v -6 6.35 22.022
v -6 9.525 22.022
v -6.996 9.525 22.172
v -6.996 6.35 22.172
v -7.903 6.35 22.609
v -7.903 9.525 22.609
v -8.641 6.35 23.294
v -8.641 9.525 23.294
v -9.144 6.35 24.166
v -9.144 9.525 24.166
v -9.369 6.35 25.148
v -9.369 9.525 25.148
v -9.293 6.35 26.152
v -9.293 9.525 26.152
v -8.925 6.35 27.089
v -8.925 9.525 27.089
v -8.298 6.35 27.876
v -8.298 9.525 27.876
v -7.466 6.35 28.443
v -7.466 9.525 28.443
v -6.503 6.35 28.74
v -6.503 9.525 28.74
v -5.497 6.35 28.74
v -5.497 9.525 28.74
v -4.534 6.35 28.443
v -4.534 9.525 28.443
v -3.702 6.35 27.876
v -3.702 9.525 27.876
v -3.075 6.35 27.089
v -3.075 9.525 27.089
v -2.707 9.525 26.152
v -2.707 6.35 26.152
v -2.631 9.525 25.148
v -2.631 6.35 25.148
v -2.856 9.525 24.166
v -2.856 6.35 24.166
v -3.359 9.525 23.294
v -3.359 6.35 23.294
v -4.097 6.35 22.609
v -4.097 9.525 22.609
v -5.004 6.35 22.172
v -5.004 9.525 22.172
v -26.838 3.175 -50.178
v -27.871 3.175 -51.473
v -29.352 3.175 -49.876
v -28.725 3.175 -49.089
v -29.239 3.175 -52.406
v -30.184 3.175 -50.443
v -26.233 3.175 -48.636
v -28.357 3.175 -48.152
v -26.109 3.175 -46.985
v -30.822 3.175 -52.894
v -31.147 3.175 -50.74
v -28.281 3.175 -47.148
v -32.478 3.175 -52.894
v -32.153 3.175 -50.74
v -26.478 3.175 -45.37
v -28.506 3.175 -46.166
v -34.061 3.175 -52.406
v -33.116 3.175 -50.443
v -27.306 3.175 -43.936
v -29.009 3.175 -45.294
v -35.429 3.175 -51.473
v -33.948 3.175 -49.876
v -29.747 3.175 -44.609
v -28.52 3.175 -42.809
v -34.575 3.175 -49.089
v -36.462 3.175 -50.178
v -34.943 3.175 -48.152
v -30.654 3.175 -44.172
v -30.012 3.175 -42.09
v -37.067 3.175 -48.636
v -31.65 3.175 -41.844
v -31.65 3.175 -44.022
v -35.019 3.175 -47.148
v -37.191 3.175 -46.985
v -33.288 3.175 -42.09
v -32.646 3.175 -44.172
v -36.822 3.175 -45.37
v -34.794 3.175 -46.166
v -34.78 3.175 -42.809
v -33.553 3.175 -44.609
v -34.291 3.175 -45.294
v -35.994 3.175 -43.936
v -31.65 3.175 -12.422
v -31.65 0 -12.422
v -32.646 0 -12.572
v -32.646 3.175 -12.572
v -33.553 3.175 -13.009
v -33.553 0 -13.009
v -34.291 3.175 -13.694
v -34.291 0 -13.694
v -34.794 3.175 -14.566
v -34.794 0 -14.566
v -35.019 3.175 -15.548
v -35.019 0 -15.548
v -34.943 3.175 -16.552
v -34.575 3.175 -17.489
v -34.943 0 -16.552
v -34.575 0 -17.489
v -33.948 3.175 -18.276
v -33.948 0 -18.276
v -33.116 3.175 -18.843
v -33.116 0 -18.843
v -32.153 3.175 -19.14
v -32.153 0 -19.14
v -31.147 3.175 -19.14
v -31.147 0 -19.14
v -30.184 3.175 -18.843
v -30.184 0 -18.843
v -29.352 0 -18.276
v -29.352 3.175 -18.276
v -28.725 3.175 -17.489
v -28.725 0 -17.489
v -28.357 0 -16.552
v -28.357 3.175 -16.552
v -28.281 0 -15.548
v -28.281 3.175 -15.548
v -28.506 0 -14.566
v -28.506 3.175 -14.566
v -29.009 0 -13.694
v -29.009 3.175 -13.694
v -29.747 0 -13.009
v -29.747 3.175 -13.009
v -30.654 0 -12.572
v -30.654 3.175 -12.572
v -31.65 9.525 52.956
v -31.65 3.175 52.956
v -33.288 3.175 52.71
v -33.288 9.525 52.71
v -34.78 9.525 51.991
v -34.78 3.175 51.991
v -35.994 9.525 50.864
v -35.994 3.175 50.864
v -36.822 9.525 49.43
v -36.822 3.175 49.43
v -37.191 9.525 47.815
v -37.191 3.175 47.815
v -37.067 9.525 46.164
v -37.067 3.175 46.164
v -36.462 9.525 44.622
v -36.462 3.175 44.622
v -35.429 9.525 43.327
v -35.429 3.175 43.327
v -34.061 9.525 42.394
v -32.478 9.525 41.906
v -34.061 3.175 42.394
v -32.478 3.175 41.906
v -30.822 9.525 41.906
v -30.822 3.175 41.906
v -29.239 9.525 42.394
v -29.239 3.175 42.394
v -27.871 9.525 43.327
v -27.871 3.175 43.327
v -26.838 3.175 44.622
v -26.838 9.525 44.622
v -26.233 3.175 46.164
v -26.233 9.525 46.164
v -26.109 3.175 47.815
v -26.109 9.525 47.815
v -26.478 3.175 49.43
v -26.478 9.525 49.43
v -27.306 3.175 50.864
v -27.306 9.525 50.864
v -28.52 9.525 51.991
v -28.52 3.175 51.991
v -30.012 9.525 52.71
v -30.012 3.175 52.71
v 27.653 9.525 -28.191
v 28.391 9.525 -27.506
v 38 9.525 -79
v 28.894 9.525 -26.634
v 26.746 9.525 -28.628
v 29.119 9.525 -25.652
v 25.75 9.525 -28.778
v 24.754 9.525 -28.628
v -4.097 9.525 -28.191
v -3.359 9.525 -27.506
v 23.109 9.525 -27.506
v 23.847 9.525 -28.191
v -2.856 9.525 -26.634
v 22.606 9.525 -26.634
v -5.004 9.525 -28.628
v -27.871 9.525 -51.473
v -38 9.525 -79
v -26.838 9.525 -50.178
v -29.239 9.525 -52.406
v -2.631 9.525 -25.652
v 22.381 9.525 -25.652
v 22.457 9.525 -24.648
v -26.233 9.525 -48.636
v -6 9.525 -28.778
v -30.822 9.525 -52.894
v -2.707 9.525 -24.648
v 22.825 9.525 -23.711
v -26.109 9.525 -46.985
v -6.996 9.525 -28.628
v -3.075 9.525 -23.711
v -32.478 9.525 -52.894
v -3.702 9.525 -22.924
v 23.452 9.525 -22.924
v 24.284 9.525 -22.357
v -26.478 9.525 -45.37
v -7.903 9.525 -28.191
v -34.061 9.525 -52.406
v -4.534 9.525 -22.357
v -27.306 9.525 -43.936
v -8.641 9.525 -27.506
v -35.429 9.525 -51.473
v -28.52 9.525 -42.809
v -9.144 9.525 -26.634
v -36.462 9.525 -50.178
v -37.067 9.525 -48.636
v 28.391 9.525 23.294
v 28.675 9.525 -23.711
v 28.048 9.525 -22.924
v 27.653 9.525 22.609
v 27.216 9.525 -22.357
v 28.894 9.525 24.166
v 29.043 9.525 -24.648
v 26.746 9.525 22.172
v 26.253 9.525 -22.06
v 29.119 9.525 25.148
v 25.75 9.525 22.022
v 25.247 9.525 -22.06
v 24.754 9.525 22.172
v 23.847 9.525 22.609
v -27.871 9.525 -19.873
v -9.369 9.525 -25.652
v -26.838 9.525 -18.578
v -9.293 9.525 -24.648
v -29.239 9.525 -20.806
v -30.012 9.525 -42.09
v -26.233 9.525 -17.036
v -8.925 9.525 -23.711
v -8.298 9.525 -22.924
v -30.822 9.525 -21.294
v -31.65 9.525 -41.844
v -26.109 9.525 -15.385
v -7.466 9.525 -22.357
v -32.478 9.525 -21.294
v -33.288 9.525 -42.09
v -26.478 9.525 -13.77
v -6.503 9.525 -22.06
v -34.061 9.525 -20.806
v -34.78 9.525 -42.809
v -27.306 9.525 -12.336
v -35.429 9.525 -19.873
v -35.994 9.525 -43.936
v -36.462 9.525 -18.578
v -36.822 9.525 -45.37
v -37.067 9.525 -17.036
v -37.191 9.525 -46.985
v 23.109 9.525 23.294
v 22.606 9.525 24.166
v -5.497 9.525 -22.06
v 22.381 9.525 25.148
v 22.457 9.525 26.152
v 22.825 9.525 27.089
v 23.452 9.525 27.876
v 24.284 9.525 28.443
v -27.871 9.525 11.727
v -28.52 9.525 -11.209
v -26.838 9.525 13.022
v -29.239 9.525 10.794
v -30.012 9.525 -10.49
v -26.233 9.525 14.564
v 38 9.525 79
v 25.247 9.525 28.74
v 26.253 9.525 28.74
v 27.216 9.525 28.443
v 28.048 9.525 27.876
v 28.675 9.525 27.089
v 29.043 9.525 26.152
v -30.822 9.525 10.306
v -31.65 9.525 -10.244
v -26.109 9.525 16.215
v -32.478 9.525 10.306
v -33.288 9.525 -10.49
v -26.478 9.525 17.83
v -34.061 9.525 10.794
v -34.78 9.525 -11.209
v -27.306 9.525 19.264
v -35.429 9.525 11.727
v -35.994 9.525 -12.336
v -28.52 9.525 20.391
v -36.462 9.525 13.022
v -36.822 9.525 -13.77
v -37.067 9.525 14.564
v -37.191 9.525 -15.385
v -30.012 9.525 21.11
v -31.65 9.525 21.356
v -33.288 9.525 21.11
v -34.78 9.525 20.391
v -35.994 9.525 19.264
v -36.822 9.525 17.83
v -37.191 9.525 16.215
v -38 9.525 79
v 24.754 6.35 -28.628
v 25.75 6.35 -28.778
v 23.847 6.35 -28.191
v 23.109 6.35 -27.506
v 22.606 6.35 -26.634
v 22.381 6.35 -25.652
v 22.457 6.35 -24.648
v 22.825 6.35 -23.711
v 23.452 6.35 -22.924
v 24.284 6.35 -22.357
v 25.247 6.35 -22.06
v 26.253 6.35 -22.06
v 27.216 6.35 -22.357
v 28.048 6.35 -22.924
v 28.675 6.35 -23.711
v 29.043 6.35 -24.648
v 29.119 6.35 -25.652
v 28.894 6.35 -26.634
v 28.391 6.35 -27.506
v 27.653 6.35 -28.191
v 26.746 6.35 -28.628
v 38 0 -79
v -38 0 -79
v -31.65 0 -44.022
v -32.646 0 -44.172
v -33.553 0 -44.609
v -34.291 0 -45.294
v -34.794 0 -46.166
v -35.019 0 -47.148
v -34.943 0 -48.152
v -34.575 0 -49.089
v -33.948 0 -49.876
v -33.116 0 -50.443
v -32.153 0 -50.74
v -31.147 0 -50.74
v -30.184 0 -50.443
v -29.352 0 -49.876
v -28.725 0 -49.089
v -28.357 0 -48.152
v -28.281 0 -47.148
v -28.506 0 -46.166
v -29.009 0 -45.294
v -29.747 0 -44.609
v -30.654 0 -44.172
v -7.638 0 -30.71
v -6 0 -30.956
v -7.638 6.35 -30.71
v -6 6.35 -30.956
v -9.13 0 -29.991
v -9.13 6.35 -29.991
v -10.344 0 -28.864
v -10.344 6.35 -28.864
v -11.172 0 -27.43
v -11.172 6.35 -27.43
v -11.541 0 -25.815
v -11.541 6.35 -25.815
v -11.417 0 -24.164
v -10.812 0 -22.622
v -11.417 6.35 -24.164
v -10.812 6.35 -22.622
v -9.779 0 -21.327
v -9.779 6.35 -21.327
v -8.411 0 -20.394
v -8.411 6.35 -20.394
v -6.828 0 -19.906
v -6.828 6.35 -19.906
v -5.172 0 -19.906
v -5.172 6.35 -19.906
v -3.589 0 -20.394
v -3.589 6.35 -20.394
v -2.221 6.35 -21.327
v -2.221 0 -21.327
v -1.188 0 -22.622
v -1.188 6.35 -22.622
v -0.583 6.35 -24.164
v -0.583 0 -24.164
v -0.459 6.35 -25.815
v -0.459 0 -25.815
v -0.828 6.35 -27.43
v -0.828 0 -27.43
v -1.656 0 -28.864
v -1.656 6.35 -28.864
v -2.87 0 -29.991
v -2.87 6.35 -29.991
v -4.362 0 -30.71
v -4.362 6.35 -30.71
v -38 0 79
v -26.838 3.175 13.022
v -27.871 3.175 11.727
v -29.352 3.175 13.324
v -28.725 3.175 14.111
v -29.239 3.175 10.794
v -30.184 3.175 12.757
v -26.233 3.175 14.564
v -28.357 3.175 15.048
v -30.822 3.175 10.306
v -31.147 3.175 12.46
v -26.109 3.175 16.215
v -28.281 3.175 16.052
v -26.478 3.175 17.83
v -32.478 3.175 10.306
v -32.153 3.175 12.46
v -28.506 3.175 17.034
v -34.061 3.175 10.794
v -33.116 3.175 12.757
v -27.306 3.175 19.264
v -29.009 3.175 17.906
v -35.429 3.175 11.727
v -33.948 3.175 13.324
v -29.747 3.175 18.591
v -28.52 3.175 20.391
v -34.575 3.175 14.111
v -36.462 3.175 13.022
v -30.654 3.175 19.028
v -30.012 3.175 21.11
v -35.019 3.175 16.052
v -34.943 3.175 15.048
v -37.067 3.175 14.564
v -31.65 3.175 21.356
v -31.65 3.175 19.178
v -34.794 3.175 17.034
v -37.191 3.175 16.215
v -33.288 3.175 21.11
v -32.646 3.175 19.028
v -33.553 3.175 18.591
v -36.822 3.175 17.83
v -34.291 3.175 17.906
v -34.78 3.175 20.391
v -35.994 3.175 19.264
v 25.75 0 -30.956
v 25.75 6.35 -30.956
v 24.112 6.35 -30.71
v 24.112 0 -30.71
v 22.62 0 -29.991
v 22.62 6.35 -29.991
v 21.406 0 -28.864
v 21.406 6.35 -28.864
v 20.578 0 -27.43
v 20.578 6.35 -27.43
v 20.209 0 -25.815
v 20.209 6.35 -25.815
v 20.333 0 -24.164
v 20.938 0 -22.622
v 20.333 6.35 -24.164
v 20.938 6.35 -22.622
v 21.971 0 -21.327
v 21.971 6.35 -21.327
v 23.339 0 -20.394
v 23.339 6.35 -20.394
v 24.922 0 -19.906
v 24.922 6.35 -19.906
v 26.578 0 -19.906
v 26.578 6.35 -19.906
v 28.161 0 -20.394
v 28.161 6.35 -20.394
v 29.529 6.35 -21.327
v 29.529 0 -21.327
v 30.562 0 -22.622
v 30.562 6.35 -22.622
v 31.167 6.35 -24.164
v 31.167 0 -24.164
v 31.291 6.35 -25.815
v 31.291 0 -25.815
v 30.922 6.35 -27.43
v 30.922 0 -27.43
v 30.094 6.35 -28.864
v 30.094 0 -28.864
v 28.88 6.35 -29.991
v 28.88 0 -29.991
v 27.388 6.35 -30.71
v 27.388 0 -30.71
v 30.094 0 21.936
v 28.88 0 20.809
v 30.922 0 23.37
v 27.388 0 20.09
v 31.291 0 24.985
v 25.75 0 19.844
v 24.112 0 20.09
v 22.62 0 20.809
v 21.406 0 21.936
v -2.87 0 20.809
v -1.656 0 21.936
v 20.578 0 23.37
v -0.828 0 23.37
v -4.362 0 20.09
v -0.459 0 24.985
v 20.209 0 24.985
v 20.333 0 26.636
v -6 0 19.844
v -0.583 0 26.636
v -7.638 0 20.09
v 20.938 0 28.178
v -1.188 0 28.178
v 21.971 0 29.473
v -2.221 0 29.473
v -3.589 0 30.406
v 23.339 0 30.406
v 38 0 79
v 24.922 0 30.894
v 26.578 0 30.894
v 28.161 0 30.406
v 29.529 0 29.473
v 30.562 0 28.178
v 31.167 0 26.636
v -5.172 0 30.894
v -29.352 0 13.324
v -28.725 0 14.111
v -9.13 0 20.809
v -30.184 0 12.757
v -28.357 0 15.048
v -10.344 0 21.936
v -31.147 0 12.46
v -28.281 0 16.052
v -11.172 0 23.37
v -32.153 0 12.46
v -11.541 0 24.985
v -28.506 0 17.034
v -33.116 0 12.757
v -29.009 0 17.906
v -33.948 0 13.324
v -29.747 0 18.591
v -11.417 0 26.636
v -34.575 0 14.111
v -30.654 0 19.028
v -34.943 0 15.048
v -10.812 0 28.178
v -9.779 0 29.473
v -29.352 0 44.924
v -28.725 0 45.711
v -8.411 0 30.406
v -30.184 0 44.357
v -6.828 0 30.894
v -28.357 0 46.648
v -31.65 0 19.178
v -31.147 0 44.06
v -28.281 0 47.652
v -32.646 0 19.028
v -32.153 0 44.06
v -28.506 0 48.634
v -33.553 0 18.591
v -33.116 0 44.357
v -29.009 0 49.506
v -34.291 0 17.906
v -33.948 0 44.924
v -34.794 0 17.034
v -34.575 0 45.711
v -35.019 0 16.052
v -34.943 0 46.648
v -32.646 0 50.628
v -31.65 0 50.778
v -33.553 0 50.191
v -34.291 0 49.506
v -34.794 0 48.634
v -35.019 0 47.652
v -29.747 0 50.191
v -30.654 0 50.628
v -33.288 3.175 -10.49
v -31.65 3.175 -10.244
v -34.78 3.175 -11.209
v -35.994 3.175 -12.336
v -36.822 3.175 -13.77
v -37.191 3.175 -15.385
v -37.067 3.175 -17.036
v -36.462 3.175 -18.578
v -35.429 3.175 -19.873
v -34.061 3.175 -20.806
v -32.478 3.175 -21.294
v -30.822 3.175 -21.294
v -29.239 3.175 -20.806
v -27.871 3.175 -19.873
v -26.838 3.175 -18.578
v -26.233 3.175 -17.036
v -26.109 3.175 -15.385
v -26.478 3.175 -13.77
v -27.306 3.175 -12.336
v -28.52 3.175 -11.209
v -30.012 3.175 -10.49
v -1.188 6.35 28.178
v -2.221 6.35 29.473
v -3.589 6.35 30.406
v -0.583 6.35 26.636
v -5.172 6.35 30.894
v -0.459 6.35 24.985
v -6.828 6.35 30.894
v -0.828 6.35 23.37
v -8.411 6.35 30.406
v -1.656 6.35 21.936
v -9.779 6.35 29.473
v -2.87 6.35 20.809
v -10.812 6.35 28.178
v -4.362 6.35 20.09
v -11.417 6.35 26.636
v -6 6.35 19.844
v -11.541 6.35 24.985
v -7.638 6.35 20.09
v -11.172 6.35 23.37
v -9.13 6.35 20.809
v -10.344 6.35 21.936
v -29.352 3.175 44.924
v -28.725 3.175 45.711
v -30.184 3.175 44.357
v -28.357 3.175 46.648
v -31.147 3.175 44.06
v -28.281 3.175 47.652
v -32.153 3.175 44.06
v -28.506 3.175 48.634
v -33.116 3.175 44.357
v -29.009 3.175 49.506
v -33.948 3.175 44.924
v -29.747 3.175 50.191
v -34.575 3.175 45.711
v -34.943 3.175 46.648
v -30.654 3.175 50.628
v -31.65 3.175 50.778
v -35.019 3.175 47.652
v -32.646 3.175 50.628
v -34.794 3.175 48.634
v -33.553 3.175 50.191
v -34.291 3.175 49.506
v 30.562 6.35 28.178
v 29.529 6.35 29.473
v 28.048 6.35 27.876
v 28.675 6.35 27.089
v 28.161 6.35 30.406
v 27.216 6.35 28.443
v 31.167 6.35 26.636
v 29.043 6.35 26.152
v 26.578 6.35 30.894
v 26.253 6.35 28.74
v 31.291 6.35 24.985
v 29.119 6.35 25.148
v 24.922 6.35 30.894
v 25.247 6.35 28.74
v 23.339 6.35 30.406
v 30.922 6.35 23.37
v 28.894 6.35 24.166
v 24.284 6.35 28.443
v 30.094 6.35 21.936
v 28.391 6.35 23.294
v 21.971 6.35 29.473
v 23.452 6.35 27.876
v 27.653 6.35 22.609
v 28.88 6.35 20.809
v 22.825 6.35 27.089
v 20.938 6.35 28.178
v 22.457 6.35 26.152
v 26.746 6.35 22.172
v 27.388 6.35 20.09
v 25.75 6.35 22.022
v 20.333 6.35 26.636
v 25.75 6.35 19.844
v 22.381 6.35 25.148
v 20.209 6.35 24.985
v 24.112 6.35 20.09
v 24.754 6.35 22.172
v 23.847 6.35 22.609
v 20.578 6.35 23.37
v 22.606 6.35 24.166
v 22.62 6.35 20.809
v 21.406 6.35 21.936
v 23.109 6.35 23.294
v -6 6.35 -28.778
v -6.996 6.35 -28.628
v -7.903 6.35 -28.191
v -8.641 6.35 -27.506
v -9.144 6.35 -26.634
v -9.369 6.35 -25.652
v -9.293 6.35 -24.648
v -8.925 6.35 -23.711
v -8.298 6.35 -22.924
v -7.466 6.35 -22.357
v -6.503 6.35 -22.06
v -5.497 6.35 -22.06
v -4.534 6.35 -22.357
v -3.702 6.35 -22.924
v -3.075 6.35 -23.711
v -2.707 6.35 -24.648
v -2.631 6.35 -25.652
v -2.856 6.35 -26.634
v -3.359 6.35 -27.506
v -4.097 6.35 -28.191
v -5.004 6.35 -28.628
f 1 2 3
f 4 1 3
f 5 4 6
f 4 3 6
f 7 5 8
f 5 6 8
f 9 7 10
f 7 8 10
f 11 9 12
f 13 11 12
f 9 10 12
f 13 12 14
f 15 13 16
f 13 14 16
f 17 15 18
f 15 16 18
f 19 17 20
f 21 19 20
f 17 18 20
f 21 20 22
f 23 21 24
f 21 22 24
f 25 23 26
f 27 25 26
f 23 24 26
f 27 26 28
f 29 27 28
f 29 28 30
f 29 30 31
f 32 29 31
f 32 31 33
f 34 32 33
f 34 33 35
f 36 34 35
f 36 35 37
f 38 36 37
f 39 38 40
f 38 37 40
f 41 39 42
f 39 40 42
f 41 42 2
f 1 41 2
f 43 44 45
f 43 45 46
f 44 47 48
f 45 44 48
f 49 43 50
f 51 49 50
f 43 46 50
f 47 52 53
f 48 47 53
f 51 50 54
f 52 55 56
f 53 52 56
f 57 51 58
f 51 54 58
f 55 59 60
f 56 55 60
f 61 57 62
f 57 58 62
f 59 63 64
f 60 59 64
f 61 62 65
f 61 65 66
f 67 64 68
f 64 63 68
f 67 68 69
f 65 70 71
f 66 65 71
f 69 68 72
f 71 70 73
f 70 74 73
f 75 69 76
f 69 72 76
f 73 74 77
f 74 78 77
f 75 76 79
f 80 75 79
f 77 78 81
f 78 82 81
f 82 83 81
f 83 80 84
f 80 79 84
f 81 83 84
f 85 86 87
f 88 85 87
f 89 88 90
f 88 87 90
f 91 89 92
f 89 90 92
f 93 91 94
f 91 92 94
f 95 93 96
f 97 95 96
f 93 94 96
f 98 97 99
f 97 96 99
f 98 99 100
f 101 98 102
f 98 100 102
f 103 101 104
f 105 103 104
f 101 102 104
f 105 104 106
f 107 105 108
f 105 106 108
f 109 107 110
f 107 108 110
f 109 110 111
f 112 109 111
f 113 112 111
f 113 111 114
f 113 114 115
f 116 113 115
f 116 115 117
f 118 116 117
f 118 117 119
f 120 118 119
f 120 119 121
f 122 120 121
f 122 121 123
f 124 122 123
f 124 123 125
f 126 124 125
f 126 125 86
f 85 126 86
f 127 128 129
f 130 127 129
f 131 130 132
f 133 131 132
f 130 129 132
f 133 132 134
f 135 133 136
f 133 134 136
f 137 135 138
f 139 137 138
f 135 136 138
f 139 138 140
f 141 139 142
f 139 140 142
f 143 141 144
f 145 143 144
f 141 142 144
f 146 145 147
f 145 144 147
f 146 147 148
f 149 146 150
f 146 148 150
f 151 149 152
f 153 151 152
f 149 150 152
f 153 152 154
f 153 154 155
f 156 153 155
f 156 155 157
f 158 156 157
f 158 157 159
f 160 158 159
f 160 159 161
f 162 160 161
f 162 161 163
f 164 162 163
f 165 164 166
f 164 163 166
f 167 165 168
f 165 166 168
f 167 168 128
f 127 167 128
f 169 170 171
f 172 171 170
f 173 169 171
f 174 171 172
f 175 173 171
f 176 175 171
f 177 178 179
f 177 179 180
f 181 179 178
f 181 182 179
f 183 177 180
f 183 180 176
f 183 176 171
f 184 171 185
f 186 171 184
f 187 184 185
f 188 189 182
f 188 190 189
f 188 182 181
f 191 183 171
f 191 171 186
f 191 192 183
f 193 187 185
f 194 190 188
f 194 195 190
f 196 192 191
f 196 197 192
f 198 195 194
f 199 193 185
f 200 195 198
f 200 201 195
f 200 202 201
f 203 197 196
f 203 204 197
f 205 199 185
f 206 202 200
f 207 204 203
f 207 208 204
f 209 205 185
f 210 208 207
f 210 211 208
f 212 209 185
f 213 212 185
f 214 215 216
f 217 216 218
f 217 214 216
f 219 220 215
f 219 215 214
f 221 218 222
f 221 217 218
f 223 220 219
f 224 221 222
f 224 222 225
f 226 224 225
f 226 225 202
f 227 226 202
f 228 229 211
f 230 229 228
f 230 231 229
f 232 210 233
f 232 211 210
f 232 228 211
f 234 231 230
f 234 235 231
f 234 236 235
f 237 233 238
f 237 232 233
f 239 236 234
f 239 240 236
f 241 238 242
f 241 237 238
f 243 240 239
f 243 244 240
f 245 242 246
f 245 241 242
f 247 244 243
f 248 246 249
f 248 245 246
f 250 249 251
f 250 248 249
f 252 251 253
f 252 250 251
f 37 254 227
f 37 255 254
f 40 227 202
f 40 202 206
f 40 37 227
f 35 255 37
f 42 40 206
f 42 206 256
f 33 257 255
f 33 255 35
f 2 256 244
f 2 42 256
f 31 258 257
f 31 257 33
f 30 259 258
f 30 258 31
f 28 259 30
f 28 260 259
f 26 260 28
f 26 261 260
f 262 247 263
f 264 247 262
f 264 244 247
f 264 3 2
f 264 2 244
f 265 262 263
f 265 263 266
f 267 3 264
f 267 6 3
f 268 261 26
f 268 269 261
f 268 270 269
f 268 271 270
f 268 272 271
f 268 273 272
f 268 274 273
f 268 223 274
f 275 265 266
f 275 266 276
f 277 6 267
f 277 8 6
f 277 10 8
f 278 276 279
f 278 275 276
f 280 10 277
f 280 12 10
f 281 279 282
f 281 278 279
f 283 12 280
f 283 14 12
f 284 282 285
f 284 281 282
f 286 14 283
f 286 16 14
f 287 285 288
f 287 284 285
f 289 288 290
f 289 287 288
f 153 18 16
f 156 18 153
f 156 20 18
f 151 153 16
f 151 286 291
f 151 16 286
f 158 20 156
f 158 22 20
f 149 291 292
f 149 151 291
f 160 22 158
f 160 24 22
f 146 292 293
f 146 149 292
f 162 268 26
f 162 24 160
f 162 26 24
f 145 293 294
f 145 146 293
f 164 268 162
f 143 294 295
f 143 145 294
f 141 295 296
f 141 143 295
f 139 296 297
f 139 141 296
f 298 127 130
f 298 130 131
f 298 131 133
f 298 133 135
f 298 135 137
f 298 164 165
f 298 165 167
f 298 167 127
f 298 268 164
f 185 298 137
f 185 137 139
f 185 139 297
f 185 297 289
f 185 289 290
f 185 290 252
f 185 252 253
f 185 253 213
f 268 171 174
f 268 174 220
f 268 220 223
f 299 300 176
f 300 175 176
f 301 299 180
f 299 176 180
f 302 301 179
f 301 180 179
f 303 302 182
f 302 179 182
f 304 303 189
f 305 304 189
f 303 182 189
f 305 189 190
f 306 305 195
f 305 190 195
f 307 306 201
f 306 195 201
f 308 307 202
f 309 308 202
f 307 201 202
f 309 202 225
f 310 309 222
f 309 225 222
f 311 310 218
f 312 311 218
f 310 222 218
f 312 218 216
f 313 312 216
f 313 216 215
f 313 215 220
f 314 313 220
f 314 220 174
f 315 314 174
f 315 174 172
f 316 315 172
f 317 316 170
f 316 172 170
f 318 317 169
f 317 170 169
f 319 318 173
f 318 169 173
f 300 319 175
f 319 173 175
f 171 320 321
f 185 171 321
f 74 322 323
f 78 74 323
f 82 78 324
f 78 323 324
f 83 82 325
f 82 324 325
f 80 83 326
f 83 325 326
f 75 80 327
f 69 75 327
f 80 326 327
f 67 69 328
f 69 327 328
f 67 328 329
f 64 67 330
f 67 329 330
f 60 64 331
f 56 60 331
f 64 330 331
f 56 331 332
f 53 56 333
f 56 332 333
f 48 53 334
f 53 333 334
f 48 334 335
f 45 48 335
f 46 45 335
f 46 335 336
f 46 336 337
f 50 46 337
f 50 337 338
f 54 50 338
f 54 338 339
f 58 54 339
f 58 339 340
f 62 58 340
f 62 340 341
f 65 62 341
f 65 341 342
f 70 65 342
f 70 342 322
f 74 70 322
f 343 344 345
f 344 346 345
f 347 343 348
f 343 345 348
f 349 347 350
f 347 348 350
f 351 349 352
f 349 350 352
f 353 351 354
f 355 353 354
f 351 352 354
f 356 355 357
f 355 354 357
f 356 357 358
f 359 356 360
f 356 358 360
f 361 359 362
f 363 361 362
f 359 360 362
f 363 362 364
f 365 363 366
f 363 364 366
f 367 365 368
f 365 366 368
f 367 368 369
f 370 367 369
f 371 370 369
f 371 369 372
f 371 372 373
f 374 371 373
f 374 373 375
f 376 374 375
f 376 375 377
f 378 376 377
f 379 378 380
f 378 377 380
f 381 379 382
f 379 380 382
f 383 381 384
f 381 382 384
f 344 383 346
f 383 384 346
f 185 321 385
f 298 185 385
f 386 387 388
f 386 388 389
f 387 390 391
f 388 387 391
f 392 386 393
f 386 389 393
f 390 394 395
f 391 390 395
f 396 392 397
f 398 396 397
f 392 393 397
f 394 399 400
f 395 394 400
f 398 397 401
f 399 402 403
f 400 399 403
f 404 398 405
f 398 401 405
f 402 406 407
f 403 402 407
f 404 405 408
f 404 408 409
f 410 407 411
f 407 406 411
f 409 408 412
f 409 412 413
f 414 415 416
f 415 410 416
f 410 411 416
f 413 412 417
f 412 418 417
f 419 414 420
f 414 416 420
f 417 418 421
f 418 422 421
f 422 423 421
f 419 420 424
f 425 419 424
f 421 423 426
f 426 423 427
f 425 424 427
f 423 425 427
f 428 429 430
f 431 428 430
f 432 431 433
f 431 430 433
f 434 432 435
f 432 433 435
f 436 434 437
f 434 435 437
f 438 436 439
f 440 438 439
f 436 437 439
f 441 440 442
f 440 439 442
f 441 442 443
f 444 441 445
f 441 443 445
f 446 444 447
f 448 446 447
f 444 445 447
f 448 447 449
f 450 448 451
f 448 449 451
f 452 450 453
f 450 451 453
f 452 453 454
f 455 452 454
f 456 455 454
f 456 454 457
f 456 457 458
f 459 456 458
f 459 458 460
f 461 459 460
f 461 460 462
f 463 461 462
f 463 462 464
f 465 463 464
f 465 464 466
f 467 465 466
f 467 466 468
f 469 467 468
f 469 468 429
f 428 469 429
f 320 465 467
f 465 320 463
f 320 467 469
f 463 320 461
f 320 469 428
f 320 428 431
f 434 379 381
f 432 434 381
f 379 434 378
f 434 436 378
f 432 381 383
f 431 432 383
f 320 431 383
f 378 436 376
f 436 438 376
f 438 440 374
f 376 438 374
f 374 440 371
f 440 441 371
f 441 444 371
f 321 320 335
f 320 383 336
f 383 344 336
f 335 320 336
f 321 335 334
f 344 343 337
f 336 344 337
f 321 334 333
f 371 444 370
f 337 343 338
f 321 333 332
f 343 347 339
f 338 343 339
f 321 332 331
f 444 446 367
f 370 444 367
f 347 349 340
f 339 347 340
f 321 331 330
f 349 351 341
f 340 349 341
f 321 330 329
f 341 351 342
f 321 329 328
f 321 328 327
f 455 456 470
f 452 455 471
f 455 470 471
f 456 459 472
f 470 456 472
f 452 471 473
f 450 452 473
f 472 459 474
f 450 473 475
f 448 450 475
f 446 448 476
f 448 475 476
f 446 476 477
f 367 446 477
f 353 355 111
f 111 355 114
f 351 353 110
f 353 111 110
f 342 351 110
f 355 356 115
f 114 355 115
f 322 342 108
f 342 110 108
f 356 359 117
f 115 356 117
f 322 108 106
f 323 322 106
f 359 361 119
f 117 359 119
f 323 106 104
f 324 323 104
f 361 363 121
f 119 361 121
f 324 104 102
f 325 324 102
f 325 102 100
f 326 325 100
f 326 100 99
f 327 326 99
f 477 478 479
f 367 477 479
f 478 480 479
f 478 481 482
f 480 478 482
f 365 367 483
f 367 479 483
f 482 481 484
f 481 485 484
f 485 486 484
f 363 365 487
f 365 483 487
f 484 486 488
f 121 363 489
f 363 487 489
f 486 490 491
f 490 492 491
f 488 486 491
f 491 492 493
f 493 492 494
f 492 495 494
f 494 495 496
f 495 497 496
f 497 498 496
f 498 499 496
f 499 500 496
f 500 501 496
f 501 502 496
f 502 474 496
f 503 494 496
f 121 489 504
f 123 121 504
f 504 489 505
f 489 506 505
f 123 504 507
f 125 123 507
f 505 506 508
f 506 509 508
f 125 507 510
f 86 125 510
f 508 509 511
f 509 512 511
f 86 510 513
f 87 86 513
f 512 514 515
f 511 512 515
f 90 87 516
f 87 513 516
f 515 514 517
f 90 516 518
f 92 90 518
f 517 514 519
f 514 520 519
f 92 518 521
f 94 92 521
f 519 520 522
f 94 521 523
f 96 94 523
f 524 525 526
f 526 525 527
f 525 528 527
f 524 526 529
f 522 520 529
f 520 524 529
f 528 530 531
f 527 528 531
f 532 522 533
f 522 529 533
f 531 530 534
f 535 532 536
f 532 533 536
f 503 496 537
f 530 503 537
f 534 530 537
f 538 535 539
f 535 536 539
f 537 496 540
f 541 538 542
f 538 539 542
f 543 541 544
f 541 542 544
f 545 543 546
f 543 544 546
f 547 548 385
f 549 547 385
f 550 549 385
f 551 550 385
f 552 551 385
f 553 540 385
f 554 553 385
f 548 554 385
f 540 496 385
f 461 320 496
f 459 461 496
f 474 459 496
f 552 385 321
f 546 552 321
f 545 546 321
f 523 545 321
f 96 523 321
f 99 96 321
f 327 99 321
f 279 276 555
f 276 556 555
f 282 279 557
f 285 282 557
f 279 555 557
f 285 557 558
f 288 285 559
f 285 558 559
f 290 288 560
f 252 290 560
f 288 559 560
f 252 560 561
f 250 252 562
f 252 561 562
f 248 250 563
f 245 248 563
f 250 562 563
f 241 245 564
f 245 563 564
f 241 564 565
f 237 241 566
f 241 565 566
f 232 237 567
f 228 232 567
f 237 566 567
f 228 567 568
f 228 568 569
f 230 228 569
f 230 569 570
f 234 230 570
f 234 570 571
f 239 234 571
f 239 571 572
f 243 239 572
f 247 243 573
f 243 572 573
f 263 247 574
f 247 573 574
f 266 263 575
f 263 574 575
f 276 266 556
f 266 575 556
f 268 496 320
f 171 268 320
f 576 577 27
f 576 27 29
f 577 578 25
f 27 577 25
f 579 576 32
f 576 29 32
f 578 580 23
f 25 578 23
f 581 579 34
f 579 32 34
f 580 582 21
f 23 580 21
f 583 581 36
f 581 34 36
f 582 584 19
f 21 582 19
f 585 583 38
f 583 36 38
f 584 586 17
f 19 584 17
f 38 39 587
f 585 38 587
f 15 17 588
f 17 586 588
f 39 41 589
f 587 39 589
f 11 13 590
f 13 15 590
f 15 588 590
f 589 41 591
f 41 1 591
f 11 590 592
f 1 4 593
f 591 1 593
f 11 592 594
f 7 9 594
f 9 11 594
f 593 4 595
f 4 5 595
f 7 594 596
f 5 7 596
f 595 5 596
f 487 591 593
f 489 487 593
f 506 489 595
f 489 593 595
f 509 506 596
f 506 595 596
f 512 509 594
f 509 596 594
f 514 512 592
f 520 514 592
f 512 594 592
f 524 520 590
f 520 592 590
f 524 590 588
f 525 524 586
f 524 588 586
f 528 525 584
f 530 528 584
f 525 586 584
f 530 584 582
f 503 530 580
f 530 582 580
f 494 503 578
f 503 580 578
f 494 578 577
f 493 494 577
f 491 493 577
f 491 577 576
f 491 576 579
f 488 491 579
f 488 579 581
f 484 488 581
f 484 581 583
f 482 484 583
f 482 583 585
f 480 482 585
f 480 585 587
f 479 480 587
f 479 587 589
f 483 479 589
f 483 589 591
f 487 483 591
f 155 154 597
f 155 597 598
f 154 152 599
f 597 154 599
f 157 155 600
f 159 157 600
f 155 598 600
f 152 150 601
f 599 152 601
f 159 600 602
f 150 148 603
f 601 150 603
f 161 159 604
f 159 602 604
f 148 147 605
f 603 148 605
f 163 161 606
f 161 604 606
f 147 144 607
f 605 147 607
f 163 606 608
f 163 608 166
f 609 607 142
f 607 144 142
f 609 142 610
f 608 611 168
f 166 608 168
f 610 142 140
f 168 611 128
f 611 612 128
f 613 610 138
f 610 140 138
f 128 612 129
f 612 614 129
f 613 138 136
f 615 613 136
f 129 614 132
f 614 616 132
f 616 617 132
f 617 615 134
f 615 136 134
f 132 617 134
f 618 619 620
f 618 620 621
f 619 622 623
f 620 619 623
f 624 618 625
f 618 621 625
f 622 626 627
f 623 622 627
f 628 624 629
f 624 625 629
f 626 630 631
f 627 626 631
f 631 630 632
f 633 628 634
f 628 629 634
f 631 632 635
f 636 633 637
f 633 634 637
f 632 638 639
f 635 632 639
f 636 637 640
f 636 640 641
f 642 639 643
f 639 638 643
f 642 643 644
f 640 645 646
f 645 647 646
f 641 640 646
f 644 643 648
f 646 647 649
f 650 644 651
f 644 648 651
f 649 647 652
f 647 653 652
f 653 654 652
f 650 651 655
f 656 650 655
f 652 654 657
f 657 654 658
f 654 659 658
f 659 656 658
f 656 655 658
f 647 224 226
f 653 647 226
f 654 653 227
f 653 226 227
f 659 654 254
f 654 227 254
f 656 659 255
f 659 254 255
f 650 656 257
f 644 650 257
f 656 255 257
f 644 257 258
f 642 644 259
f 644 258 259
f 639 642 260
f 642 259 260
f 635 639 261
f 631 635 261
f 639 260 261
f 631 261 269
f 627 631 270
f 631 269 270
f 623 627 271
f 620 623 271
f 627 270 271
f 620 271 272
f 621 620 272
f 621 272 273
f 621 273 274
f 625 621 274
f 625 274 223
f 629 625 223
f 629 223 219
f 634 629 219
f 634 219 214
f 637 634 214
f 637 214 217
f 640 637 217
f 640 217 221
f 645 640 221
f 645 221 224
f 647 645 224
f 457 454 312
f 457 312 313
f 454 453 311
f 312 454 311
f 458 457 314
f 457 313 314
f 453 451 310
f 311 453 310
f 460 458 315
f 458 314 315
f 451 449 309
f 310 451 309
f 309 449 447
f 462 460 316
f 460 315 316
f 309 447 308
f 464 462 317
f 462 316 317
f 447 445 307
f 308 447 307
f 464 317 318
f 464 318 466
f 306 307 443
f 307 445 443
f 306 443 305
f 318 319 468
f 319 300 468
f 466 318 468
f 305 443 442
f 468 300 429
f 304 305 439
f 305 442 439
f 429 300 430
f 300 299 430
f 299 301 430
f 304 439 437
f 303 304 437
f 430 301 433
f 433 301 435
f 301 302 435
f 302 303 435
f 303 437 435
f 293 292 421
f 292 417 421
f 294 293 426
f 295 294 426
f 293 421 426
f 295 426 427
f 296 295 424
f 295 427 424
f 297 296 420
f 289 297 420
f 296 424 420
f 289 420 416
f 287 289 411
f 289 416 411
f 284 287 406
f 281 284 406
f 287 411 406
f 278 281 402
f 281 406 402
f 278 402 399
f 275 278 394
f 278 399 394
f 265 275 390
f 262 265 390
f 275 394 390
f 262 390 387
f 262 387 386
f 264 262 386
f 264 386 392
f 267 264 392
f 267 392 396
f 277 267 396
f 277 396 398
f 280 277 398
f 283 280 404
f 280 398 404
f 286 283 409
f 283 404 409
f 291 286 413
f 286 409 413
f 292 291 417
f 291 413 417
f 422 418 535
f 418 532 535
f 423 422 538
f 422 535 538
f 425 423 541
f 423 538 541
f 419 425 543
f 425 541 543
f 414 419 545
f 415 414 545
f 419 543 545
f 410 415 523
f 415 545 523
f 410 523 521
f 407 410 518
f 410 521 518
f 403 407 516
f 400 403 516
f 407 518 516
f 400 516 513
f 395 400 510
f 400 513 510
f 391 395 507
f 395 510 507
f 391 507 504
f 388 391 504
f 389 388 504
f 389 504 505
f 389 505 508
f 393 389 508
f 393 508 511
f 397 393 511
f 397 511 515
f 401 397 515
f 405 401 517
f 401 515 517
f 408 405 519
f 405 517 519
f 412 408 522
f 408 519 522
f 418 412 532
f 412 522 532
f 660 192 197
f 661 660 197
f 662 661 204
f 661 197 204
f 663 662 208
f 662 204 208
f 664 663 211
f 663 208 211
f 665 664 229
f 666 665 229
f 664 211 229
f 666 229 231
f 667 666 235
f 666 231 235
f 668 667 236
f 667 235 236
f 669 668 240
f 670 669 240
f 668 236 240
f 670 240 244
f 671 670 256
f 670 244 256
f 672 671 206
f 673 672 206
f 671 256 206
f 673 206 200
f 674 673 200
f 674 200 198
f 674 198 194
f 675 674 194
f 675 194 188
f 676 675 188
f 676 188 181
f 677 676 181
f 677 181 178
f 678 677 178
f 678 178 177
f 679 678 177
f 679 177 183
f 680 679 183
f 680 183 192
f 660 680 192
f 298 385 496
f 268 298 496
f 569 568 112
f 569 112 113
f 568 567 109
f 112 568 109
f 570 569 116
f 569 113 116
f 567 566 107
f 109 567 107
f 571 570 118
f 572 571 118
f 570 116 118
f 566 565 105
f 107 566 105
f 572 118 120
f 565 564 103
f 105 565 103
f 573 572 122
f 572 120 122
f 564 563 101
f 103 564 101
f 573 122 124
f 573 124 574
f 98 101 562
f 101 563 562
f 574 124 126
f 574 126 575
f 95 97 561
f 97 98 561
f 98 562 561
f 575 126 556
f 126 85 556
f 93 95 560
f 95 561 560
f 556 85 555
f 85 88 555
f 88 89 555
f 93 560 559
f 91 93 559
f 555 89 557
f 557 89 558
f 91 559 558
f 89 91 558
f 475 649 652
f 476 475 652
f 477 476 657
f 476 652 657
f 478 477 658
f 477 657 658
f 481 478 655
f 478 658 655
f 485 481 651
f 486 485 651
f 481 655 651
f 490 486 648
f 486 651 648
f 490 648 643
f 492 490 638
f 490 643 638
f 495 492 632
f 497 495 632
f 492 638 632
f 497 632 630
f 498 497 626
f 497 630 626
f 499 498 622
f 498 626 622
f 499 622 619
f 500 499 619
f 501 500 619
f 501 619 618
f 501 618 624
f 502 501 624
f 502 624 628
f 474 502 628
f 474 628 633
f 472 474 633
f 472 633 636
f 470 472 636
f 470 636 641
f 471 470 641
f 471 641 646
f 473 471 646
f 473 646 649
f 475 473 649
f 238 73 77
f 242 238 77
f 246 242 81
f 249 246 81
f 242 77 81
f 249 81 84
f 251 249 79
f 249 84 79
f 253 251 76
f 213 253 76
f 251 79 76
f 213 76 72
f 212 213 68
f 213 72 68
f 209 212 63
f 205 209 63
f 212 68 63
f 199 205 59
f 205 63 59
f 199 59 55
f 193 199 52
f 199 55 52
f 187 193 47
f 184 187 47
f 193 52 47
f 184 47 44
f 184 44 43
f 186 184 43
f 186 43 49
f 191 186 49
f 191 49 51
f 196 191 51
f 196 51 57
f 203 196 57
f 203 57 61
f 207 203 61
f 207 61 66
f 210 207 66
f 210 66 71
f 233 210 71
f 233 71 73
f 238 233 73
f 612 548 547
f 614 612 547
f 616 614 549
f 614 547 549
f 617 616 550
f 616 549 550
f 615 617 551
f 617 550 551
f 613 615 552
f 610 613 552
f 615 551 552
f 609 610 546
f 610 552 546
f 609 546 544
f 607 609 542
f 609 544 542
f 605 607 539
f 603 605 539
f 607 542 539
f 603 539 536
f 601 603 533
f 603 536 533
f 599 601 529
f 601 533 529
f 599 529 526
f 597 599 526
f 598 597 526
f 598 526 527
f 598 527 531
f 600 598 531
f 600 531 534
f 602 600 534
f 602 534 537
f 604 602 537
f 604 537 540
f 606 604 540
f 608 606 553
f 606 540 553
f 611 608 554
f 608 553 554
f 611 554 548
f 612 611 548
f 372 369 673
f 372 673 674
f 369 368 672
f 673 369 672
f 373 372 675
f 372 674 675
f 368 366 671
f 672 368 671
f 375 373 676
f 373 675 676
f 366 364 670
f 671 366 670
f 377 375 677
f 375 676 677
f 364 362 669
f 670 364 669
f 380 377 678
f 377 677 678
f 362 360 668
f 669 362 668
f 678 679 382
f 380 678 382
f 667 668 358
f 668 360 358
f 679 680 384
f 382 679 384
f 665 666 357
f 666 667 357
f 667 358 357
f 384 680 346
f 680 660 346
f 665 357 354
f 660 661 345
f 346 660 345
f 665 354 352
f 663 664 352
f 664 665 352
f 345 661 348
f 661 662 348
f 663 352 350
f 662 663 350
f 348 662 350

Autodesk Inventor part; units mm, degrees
ref_plane "YZ Plane" through (0, 0, 0) normal (1, 0, 0) x (0, 1, 0)
ref_plane "XZ Plane" through (0, 0, 0) normal (0, 1, 0) x (-1, 0, 0)
ref_plane "XY Plane" through (0, 0, 0) normal (0, 0, 1) x (1, 0, 0)
sketch "Sketch1" plane through (0, 0, 0) normal (0, 1, 0) x (-1, 0, 0)
  line L0 (38, 79) -> (-38, 79)
  line L1 (-38, 79) -> (-38, -79)
  line L2 (-38, -79) -> (38, -79)
  line L3 (38, -79) -> (38, 79)
  line L4 (0, 0) -> (38, 0) construction
  line L5 (0, 0) -> (0, -79) construction
  dimension "d0" = 158
  dimension "d1" = 76
extrude "Extrusion1" add sketch "Sketch1" along normal blind 9.525
sketch "Sketch2" plane through (0, 0, 0) normal (0, -1, 0) x (1, 0, 0)
  line L0 (-38, 79) -> (38, 79) construction
  line L1 (-38, -79) -> (-38, 79) construction
  line L2 (38, -79) -> (-38, -79) construction
  line L3 (38, 79) -> (38, -79) construction
  line L4 (-6, -25.4) -> (-6, 25.4) construction
  line L5 (-38, 0) -> (38, 0) construction
  line L6 (25.75, -25.4) -> (25.75, 25.4) construction
  point P0 (0, 0)
  point P1 (-6, 0)
  point P2 (25.75, 0)
  dimension "d4" = 50.8
  dimension "d5" = 50.8
  dimension "d6" = 31.75
  dimension "d16" = 32
hole "Hole1" at (-6, 0, 25.4) at (25.75, 0, 25.4) at (25.75, 0, -25.4) at (-6, 0, -25.4) direction (0, 1, 0) diameter 6.756 end through all counterbore diameter 11.113 counterbore depth 6.35 clearance for "Socket Head Cap Screw" size "1/4" standard "Ansi Unified Screw Threads"
sketch "Sketch3" plane through (0, 9.525, 0) normal (0, 1, 0) x (1, 0, 0)
  line L0 (38, -79) -> (38, 79) construction
  line L1 (38, 79) -> (-38, 79) construction
  line L2 (-38, 79) -> (-38, -79) construction
  line L3 (-38, -79) -> (38, -79) construction
  line L4 (-31.65, 79) -> (-31.65, -79) construction
  point P0 (0, 0)
  point P1 (-31.65, 47.4)
  point P2 (-31.65, 15.8)
  point P3 (-31.65, -47.4)
  point P4 (-31.65, -15.8)
  dimension "d17" = 6.35
  dimension "d19" = 31.6
  dimension "d20" = 31.6
  dimension "d21" = 31.6
  dimension "d22" = 31.6
  dimension "d23" = 31.6
hole "Hole2" at (-31.65, 9.525, -47.4) at (-31.65, 9.525, -15.8) at (-31.65, 9.525, 47.4) at (-31.65, 9.525, 15.8) direction (0, -1, 0) diameter 6.756 end through all counterbore diameter 11.113 counterbore depth 6.35 clearance for "Socket Head Cap Screw" size "1/4" standard "Ansi Unified Screw Threads"
properties part number "base_part"
